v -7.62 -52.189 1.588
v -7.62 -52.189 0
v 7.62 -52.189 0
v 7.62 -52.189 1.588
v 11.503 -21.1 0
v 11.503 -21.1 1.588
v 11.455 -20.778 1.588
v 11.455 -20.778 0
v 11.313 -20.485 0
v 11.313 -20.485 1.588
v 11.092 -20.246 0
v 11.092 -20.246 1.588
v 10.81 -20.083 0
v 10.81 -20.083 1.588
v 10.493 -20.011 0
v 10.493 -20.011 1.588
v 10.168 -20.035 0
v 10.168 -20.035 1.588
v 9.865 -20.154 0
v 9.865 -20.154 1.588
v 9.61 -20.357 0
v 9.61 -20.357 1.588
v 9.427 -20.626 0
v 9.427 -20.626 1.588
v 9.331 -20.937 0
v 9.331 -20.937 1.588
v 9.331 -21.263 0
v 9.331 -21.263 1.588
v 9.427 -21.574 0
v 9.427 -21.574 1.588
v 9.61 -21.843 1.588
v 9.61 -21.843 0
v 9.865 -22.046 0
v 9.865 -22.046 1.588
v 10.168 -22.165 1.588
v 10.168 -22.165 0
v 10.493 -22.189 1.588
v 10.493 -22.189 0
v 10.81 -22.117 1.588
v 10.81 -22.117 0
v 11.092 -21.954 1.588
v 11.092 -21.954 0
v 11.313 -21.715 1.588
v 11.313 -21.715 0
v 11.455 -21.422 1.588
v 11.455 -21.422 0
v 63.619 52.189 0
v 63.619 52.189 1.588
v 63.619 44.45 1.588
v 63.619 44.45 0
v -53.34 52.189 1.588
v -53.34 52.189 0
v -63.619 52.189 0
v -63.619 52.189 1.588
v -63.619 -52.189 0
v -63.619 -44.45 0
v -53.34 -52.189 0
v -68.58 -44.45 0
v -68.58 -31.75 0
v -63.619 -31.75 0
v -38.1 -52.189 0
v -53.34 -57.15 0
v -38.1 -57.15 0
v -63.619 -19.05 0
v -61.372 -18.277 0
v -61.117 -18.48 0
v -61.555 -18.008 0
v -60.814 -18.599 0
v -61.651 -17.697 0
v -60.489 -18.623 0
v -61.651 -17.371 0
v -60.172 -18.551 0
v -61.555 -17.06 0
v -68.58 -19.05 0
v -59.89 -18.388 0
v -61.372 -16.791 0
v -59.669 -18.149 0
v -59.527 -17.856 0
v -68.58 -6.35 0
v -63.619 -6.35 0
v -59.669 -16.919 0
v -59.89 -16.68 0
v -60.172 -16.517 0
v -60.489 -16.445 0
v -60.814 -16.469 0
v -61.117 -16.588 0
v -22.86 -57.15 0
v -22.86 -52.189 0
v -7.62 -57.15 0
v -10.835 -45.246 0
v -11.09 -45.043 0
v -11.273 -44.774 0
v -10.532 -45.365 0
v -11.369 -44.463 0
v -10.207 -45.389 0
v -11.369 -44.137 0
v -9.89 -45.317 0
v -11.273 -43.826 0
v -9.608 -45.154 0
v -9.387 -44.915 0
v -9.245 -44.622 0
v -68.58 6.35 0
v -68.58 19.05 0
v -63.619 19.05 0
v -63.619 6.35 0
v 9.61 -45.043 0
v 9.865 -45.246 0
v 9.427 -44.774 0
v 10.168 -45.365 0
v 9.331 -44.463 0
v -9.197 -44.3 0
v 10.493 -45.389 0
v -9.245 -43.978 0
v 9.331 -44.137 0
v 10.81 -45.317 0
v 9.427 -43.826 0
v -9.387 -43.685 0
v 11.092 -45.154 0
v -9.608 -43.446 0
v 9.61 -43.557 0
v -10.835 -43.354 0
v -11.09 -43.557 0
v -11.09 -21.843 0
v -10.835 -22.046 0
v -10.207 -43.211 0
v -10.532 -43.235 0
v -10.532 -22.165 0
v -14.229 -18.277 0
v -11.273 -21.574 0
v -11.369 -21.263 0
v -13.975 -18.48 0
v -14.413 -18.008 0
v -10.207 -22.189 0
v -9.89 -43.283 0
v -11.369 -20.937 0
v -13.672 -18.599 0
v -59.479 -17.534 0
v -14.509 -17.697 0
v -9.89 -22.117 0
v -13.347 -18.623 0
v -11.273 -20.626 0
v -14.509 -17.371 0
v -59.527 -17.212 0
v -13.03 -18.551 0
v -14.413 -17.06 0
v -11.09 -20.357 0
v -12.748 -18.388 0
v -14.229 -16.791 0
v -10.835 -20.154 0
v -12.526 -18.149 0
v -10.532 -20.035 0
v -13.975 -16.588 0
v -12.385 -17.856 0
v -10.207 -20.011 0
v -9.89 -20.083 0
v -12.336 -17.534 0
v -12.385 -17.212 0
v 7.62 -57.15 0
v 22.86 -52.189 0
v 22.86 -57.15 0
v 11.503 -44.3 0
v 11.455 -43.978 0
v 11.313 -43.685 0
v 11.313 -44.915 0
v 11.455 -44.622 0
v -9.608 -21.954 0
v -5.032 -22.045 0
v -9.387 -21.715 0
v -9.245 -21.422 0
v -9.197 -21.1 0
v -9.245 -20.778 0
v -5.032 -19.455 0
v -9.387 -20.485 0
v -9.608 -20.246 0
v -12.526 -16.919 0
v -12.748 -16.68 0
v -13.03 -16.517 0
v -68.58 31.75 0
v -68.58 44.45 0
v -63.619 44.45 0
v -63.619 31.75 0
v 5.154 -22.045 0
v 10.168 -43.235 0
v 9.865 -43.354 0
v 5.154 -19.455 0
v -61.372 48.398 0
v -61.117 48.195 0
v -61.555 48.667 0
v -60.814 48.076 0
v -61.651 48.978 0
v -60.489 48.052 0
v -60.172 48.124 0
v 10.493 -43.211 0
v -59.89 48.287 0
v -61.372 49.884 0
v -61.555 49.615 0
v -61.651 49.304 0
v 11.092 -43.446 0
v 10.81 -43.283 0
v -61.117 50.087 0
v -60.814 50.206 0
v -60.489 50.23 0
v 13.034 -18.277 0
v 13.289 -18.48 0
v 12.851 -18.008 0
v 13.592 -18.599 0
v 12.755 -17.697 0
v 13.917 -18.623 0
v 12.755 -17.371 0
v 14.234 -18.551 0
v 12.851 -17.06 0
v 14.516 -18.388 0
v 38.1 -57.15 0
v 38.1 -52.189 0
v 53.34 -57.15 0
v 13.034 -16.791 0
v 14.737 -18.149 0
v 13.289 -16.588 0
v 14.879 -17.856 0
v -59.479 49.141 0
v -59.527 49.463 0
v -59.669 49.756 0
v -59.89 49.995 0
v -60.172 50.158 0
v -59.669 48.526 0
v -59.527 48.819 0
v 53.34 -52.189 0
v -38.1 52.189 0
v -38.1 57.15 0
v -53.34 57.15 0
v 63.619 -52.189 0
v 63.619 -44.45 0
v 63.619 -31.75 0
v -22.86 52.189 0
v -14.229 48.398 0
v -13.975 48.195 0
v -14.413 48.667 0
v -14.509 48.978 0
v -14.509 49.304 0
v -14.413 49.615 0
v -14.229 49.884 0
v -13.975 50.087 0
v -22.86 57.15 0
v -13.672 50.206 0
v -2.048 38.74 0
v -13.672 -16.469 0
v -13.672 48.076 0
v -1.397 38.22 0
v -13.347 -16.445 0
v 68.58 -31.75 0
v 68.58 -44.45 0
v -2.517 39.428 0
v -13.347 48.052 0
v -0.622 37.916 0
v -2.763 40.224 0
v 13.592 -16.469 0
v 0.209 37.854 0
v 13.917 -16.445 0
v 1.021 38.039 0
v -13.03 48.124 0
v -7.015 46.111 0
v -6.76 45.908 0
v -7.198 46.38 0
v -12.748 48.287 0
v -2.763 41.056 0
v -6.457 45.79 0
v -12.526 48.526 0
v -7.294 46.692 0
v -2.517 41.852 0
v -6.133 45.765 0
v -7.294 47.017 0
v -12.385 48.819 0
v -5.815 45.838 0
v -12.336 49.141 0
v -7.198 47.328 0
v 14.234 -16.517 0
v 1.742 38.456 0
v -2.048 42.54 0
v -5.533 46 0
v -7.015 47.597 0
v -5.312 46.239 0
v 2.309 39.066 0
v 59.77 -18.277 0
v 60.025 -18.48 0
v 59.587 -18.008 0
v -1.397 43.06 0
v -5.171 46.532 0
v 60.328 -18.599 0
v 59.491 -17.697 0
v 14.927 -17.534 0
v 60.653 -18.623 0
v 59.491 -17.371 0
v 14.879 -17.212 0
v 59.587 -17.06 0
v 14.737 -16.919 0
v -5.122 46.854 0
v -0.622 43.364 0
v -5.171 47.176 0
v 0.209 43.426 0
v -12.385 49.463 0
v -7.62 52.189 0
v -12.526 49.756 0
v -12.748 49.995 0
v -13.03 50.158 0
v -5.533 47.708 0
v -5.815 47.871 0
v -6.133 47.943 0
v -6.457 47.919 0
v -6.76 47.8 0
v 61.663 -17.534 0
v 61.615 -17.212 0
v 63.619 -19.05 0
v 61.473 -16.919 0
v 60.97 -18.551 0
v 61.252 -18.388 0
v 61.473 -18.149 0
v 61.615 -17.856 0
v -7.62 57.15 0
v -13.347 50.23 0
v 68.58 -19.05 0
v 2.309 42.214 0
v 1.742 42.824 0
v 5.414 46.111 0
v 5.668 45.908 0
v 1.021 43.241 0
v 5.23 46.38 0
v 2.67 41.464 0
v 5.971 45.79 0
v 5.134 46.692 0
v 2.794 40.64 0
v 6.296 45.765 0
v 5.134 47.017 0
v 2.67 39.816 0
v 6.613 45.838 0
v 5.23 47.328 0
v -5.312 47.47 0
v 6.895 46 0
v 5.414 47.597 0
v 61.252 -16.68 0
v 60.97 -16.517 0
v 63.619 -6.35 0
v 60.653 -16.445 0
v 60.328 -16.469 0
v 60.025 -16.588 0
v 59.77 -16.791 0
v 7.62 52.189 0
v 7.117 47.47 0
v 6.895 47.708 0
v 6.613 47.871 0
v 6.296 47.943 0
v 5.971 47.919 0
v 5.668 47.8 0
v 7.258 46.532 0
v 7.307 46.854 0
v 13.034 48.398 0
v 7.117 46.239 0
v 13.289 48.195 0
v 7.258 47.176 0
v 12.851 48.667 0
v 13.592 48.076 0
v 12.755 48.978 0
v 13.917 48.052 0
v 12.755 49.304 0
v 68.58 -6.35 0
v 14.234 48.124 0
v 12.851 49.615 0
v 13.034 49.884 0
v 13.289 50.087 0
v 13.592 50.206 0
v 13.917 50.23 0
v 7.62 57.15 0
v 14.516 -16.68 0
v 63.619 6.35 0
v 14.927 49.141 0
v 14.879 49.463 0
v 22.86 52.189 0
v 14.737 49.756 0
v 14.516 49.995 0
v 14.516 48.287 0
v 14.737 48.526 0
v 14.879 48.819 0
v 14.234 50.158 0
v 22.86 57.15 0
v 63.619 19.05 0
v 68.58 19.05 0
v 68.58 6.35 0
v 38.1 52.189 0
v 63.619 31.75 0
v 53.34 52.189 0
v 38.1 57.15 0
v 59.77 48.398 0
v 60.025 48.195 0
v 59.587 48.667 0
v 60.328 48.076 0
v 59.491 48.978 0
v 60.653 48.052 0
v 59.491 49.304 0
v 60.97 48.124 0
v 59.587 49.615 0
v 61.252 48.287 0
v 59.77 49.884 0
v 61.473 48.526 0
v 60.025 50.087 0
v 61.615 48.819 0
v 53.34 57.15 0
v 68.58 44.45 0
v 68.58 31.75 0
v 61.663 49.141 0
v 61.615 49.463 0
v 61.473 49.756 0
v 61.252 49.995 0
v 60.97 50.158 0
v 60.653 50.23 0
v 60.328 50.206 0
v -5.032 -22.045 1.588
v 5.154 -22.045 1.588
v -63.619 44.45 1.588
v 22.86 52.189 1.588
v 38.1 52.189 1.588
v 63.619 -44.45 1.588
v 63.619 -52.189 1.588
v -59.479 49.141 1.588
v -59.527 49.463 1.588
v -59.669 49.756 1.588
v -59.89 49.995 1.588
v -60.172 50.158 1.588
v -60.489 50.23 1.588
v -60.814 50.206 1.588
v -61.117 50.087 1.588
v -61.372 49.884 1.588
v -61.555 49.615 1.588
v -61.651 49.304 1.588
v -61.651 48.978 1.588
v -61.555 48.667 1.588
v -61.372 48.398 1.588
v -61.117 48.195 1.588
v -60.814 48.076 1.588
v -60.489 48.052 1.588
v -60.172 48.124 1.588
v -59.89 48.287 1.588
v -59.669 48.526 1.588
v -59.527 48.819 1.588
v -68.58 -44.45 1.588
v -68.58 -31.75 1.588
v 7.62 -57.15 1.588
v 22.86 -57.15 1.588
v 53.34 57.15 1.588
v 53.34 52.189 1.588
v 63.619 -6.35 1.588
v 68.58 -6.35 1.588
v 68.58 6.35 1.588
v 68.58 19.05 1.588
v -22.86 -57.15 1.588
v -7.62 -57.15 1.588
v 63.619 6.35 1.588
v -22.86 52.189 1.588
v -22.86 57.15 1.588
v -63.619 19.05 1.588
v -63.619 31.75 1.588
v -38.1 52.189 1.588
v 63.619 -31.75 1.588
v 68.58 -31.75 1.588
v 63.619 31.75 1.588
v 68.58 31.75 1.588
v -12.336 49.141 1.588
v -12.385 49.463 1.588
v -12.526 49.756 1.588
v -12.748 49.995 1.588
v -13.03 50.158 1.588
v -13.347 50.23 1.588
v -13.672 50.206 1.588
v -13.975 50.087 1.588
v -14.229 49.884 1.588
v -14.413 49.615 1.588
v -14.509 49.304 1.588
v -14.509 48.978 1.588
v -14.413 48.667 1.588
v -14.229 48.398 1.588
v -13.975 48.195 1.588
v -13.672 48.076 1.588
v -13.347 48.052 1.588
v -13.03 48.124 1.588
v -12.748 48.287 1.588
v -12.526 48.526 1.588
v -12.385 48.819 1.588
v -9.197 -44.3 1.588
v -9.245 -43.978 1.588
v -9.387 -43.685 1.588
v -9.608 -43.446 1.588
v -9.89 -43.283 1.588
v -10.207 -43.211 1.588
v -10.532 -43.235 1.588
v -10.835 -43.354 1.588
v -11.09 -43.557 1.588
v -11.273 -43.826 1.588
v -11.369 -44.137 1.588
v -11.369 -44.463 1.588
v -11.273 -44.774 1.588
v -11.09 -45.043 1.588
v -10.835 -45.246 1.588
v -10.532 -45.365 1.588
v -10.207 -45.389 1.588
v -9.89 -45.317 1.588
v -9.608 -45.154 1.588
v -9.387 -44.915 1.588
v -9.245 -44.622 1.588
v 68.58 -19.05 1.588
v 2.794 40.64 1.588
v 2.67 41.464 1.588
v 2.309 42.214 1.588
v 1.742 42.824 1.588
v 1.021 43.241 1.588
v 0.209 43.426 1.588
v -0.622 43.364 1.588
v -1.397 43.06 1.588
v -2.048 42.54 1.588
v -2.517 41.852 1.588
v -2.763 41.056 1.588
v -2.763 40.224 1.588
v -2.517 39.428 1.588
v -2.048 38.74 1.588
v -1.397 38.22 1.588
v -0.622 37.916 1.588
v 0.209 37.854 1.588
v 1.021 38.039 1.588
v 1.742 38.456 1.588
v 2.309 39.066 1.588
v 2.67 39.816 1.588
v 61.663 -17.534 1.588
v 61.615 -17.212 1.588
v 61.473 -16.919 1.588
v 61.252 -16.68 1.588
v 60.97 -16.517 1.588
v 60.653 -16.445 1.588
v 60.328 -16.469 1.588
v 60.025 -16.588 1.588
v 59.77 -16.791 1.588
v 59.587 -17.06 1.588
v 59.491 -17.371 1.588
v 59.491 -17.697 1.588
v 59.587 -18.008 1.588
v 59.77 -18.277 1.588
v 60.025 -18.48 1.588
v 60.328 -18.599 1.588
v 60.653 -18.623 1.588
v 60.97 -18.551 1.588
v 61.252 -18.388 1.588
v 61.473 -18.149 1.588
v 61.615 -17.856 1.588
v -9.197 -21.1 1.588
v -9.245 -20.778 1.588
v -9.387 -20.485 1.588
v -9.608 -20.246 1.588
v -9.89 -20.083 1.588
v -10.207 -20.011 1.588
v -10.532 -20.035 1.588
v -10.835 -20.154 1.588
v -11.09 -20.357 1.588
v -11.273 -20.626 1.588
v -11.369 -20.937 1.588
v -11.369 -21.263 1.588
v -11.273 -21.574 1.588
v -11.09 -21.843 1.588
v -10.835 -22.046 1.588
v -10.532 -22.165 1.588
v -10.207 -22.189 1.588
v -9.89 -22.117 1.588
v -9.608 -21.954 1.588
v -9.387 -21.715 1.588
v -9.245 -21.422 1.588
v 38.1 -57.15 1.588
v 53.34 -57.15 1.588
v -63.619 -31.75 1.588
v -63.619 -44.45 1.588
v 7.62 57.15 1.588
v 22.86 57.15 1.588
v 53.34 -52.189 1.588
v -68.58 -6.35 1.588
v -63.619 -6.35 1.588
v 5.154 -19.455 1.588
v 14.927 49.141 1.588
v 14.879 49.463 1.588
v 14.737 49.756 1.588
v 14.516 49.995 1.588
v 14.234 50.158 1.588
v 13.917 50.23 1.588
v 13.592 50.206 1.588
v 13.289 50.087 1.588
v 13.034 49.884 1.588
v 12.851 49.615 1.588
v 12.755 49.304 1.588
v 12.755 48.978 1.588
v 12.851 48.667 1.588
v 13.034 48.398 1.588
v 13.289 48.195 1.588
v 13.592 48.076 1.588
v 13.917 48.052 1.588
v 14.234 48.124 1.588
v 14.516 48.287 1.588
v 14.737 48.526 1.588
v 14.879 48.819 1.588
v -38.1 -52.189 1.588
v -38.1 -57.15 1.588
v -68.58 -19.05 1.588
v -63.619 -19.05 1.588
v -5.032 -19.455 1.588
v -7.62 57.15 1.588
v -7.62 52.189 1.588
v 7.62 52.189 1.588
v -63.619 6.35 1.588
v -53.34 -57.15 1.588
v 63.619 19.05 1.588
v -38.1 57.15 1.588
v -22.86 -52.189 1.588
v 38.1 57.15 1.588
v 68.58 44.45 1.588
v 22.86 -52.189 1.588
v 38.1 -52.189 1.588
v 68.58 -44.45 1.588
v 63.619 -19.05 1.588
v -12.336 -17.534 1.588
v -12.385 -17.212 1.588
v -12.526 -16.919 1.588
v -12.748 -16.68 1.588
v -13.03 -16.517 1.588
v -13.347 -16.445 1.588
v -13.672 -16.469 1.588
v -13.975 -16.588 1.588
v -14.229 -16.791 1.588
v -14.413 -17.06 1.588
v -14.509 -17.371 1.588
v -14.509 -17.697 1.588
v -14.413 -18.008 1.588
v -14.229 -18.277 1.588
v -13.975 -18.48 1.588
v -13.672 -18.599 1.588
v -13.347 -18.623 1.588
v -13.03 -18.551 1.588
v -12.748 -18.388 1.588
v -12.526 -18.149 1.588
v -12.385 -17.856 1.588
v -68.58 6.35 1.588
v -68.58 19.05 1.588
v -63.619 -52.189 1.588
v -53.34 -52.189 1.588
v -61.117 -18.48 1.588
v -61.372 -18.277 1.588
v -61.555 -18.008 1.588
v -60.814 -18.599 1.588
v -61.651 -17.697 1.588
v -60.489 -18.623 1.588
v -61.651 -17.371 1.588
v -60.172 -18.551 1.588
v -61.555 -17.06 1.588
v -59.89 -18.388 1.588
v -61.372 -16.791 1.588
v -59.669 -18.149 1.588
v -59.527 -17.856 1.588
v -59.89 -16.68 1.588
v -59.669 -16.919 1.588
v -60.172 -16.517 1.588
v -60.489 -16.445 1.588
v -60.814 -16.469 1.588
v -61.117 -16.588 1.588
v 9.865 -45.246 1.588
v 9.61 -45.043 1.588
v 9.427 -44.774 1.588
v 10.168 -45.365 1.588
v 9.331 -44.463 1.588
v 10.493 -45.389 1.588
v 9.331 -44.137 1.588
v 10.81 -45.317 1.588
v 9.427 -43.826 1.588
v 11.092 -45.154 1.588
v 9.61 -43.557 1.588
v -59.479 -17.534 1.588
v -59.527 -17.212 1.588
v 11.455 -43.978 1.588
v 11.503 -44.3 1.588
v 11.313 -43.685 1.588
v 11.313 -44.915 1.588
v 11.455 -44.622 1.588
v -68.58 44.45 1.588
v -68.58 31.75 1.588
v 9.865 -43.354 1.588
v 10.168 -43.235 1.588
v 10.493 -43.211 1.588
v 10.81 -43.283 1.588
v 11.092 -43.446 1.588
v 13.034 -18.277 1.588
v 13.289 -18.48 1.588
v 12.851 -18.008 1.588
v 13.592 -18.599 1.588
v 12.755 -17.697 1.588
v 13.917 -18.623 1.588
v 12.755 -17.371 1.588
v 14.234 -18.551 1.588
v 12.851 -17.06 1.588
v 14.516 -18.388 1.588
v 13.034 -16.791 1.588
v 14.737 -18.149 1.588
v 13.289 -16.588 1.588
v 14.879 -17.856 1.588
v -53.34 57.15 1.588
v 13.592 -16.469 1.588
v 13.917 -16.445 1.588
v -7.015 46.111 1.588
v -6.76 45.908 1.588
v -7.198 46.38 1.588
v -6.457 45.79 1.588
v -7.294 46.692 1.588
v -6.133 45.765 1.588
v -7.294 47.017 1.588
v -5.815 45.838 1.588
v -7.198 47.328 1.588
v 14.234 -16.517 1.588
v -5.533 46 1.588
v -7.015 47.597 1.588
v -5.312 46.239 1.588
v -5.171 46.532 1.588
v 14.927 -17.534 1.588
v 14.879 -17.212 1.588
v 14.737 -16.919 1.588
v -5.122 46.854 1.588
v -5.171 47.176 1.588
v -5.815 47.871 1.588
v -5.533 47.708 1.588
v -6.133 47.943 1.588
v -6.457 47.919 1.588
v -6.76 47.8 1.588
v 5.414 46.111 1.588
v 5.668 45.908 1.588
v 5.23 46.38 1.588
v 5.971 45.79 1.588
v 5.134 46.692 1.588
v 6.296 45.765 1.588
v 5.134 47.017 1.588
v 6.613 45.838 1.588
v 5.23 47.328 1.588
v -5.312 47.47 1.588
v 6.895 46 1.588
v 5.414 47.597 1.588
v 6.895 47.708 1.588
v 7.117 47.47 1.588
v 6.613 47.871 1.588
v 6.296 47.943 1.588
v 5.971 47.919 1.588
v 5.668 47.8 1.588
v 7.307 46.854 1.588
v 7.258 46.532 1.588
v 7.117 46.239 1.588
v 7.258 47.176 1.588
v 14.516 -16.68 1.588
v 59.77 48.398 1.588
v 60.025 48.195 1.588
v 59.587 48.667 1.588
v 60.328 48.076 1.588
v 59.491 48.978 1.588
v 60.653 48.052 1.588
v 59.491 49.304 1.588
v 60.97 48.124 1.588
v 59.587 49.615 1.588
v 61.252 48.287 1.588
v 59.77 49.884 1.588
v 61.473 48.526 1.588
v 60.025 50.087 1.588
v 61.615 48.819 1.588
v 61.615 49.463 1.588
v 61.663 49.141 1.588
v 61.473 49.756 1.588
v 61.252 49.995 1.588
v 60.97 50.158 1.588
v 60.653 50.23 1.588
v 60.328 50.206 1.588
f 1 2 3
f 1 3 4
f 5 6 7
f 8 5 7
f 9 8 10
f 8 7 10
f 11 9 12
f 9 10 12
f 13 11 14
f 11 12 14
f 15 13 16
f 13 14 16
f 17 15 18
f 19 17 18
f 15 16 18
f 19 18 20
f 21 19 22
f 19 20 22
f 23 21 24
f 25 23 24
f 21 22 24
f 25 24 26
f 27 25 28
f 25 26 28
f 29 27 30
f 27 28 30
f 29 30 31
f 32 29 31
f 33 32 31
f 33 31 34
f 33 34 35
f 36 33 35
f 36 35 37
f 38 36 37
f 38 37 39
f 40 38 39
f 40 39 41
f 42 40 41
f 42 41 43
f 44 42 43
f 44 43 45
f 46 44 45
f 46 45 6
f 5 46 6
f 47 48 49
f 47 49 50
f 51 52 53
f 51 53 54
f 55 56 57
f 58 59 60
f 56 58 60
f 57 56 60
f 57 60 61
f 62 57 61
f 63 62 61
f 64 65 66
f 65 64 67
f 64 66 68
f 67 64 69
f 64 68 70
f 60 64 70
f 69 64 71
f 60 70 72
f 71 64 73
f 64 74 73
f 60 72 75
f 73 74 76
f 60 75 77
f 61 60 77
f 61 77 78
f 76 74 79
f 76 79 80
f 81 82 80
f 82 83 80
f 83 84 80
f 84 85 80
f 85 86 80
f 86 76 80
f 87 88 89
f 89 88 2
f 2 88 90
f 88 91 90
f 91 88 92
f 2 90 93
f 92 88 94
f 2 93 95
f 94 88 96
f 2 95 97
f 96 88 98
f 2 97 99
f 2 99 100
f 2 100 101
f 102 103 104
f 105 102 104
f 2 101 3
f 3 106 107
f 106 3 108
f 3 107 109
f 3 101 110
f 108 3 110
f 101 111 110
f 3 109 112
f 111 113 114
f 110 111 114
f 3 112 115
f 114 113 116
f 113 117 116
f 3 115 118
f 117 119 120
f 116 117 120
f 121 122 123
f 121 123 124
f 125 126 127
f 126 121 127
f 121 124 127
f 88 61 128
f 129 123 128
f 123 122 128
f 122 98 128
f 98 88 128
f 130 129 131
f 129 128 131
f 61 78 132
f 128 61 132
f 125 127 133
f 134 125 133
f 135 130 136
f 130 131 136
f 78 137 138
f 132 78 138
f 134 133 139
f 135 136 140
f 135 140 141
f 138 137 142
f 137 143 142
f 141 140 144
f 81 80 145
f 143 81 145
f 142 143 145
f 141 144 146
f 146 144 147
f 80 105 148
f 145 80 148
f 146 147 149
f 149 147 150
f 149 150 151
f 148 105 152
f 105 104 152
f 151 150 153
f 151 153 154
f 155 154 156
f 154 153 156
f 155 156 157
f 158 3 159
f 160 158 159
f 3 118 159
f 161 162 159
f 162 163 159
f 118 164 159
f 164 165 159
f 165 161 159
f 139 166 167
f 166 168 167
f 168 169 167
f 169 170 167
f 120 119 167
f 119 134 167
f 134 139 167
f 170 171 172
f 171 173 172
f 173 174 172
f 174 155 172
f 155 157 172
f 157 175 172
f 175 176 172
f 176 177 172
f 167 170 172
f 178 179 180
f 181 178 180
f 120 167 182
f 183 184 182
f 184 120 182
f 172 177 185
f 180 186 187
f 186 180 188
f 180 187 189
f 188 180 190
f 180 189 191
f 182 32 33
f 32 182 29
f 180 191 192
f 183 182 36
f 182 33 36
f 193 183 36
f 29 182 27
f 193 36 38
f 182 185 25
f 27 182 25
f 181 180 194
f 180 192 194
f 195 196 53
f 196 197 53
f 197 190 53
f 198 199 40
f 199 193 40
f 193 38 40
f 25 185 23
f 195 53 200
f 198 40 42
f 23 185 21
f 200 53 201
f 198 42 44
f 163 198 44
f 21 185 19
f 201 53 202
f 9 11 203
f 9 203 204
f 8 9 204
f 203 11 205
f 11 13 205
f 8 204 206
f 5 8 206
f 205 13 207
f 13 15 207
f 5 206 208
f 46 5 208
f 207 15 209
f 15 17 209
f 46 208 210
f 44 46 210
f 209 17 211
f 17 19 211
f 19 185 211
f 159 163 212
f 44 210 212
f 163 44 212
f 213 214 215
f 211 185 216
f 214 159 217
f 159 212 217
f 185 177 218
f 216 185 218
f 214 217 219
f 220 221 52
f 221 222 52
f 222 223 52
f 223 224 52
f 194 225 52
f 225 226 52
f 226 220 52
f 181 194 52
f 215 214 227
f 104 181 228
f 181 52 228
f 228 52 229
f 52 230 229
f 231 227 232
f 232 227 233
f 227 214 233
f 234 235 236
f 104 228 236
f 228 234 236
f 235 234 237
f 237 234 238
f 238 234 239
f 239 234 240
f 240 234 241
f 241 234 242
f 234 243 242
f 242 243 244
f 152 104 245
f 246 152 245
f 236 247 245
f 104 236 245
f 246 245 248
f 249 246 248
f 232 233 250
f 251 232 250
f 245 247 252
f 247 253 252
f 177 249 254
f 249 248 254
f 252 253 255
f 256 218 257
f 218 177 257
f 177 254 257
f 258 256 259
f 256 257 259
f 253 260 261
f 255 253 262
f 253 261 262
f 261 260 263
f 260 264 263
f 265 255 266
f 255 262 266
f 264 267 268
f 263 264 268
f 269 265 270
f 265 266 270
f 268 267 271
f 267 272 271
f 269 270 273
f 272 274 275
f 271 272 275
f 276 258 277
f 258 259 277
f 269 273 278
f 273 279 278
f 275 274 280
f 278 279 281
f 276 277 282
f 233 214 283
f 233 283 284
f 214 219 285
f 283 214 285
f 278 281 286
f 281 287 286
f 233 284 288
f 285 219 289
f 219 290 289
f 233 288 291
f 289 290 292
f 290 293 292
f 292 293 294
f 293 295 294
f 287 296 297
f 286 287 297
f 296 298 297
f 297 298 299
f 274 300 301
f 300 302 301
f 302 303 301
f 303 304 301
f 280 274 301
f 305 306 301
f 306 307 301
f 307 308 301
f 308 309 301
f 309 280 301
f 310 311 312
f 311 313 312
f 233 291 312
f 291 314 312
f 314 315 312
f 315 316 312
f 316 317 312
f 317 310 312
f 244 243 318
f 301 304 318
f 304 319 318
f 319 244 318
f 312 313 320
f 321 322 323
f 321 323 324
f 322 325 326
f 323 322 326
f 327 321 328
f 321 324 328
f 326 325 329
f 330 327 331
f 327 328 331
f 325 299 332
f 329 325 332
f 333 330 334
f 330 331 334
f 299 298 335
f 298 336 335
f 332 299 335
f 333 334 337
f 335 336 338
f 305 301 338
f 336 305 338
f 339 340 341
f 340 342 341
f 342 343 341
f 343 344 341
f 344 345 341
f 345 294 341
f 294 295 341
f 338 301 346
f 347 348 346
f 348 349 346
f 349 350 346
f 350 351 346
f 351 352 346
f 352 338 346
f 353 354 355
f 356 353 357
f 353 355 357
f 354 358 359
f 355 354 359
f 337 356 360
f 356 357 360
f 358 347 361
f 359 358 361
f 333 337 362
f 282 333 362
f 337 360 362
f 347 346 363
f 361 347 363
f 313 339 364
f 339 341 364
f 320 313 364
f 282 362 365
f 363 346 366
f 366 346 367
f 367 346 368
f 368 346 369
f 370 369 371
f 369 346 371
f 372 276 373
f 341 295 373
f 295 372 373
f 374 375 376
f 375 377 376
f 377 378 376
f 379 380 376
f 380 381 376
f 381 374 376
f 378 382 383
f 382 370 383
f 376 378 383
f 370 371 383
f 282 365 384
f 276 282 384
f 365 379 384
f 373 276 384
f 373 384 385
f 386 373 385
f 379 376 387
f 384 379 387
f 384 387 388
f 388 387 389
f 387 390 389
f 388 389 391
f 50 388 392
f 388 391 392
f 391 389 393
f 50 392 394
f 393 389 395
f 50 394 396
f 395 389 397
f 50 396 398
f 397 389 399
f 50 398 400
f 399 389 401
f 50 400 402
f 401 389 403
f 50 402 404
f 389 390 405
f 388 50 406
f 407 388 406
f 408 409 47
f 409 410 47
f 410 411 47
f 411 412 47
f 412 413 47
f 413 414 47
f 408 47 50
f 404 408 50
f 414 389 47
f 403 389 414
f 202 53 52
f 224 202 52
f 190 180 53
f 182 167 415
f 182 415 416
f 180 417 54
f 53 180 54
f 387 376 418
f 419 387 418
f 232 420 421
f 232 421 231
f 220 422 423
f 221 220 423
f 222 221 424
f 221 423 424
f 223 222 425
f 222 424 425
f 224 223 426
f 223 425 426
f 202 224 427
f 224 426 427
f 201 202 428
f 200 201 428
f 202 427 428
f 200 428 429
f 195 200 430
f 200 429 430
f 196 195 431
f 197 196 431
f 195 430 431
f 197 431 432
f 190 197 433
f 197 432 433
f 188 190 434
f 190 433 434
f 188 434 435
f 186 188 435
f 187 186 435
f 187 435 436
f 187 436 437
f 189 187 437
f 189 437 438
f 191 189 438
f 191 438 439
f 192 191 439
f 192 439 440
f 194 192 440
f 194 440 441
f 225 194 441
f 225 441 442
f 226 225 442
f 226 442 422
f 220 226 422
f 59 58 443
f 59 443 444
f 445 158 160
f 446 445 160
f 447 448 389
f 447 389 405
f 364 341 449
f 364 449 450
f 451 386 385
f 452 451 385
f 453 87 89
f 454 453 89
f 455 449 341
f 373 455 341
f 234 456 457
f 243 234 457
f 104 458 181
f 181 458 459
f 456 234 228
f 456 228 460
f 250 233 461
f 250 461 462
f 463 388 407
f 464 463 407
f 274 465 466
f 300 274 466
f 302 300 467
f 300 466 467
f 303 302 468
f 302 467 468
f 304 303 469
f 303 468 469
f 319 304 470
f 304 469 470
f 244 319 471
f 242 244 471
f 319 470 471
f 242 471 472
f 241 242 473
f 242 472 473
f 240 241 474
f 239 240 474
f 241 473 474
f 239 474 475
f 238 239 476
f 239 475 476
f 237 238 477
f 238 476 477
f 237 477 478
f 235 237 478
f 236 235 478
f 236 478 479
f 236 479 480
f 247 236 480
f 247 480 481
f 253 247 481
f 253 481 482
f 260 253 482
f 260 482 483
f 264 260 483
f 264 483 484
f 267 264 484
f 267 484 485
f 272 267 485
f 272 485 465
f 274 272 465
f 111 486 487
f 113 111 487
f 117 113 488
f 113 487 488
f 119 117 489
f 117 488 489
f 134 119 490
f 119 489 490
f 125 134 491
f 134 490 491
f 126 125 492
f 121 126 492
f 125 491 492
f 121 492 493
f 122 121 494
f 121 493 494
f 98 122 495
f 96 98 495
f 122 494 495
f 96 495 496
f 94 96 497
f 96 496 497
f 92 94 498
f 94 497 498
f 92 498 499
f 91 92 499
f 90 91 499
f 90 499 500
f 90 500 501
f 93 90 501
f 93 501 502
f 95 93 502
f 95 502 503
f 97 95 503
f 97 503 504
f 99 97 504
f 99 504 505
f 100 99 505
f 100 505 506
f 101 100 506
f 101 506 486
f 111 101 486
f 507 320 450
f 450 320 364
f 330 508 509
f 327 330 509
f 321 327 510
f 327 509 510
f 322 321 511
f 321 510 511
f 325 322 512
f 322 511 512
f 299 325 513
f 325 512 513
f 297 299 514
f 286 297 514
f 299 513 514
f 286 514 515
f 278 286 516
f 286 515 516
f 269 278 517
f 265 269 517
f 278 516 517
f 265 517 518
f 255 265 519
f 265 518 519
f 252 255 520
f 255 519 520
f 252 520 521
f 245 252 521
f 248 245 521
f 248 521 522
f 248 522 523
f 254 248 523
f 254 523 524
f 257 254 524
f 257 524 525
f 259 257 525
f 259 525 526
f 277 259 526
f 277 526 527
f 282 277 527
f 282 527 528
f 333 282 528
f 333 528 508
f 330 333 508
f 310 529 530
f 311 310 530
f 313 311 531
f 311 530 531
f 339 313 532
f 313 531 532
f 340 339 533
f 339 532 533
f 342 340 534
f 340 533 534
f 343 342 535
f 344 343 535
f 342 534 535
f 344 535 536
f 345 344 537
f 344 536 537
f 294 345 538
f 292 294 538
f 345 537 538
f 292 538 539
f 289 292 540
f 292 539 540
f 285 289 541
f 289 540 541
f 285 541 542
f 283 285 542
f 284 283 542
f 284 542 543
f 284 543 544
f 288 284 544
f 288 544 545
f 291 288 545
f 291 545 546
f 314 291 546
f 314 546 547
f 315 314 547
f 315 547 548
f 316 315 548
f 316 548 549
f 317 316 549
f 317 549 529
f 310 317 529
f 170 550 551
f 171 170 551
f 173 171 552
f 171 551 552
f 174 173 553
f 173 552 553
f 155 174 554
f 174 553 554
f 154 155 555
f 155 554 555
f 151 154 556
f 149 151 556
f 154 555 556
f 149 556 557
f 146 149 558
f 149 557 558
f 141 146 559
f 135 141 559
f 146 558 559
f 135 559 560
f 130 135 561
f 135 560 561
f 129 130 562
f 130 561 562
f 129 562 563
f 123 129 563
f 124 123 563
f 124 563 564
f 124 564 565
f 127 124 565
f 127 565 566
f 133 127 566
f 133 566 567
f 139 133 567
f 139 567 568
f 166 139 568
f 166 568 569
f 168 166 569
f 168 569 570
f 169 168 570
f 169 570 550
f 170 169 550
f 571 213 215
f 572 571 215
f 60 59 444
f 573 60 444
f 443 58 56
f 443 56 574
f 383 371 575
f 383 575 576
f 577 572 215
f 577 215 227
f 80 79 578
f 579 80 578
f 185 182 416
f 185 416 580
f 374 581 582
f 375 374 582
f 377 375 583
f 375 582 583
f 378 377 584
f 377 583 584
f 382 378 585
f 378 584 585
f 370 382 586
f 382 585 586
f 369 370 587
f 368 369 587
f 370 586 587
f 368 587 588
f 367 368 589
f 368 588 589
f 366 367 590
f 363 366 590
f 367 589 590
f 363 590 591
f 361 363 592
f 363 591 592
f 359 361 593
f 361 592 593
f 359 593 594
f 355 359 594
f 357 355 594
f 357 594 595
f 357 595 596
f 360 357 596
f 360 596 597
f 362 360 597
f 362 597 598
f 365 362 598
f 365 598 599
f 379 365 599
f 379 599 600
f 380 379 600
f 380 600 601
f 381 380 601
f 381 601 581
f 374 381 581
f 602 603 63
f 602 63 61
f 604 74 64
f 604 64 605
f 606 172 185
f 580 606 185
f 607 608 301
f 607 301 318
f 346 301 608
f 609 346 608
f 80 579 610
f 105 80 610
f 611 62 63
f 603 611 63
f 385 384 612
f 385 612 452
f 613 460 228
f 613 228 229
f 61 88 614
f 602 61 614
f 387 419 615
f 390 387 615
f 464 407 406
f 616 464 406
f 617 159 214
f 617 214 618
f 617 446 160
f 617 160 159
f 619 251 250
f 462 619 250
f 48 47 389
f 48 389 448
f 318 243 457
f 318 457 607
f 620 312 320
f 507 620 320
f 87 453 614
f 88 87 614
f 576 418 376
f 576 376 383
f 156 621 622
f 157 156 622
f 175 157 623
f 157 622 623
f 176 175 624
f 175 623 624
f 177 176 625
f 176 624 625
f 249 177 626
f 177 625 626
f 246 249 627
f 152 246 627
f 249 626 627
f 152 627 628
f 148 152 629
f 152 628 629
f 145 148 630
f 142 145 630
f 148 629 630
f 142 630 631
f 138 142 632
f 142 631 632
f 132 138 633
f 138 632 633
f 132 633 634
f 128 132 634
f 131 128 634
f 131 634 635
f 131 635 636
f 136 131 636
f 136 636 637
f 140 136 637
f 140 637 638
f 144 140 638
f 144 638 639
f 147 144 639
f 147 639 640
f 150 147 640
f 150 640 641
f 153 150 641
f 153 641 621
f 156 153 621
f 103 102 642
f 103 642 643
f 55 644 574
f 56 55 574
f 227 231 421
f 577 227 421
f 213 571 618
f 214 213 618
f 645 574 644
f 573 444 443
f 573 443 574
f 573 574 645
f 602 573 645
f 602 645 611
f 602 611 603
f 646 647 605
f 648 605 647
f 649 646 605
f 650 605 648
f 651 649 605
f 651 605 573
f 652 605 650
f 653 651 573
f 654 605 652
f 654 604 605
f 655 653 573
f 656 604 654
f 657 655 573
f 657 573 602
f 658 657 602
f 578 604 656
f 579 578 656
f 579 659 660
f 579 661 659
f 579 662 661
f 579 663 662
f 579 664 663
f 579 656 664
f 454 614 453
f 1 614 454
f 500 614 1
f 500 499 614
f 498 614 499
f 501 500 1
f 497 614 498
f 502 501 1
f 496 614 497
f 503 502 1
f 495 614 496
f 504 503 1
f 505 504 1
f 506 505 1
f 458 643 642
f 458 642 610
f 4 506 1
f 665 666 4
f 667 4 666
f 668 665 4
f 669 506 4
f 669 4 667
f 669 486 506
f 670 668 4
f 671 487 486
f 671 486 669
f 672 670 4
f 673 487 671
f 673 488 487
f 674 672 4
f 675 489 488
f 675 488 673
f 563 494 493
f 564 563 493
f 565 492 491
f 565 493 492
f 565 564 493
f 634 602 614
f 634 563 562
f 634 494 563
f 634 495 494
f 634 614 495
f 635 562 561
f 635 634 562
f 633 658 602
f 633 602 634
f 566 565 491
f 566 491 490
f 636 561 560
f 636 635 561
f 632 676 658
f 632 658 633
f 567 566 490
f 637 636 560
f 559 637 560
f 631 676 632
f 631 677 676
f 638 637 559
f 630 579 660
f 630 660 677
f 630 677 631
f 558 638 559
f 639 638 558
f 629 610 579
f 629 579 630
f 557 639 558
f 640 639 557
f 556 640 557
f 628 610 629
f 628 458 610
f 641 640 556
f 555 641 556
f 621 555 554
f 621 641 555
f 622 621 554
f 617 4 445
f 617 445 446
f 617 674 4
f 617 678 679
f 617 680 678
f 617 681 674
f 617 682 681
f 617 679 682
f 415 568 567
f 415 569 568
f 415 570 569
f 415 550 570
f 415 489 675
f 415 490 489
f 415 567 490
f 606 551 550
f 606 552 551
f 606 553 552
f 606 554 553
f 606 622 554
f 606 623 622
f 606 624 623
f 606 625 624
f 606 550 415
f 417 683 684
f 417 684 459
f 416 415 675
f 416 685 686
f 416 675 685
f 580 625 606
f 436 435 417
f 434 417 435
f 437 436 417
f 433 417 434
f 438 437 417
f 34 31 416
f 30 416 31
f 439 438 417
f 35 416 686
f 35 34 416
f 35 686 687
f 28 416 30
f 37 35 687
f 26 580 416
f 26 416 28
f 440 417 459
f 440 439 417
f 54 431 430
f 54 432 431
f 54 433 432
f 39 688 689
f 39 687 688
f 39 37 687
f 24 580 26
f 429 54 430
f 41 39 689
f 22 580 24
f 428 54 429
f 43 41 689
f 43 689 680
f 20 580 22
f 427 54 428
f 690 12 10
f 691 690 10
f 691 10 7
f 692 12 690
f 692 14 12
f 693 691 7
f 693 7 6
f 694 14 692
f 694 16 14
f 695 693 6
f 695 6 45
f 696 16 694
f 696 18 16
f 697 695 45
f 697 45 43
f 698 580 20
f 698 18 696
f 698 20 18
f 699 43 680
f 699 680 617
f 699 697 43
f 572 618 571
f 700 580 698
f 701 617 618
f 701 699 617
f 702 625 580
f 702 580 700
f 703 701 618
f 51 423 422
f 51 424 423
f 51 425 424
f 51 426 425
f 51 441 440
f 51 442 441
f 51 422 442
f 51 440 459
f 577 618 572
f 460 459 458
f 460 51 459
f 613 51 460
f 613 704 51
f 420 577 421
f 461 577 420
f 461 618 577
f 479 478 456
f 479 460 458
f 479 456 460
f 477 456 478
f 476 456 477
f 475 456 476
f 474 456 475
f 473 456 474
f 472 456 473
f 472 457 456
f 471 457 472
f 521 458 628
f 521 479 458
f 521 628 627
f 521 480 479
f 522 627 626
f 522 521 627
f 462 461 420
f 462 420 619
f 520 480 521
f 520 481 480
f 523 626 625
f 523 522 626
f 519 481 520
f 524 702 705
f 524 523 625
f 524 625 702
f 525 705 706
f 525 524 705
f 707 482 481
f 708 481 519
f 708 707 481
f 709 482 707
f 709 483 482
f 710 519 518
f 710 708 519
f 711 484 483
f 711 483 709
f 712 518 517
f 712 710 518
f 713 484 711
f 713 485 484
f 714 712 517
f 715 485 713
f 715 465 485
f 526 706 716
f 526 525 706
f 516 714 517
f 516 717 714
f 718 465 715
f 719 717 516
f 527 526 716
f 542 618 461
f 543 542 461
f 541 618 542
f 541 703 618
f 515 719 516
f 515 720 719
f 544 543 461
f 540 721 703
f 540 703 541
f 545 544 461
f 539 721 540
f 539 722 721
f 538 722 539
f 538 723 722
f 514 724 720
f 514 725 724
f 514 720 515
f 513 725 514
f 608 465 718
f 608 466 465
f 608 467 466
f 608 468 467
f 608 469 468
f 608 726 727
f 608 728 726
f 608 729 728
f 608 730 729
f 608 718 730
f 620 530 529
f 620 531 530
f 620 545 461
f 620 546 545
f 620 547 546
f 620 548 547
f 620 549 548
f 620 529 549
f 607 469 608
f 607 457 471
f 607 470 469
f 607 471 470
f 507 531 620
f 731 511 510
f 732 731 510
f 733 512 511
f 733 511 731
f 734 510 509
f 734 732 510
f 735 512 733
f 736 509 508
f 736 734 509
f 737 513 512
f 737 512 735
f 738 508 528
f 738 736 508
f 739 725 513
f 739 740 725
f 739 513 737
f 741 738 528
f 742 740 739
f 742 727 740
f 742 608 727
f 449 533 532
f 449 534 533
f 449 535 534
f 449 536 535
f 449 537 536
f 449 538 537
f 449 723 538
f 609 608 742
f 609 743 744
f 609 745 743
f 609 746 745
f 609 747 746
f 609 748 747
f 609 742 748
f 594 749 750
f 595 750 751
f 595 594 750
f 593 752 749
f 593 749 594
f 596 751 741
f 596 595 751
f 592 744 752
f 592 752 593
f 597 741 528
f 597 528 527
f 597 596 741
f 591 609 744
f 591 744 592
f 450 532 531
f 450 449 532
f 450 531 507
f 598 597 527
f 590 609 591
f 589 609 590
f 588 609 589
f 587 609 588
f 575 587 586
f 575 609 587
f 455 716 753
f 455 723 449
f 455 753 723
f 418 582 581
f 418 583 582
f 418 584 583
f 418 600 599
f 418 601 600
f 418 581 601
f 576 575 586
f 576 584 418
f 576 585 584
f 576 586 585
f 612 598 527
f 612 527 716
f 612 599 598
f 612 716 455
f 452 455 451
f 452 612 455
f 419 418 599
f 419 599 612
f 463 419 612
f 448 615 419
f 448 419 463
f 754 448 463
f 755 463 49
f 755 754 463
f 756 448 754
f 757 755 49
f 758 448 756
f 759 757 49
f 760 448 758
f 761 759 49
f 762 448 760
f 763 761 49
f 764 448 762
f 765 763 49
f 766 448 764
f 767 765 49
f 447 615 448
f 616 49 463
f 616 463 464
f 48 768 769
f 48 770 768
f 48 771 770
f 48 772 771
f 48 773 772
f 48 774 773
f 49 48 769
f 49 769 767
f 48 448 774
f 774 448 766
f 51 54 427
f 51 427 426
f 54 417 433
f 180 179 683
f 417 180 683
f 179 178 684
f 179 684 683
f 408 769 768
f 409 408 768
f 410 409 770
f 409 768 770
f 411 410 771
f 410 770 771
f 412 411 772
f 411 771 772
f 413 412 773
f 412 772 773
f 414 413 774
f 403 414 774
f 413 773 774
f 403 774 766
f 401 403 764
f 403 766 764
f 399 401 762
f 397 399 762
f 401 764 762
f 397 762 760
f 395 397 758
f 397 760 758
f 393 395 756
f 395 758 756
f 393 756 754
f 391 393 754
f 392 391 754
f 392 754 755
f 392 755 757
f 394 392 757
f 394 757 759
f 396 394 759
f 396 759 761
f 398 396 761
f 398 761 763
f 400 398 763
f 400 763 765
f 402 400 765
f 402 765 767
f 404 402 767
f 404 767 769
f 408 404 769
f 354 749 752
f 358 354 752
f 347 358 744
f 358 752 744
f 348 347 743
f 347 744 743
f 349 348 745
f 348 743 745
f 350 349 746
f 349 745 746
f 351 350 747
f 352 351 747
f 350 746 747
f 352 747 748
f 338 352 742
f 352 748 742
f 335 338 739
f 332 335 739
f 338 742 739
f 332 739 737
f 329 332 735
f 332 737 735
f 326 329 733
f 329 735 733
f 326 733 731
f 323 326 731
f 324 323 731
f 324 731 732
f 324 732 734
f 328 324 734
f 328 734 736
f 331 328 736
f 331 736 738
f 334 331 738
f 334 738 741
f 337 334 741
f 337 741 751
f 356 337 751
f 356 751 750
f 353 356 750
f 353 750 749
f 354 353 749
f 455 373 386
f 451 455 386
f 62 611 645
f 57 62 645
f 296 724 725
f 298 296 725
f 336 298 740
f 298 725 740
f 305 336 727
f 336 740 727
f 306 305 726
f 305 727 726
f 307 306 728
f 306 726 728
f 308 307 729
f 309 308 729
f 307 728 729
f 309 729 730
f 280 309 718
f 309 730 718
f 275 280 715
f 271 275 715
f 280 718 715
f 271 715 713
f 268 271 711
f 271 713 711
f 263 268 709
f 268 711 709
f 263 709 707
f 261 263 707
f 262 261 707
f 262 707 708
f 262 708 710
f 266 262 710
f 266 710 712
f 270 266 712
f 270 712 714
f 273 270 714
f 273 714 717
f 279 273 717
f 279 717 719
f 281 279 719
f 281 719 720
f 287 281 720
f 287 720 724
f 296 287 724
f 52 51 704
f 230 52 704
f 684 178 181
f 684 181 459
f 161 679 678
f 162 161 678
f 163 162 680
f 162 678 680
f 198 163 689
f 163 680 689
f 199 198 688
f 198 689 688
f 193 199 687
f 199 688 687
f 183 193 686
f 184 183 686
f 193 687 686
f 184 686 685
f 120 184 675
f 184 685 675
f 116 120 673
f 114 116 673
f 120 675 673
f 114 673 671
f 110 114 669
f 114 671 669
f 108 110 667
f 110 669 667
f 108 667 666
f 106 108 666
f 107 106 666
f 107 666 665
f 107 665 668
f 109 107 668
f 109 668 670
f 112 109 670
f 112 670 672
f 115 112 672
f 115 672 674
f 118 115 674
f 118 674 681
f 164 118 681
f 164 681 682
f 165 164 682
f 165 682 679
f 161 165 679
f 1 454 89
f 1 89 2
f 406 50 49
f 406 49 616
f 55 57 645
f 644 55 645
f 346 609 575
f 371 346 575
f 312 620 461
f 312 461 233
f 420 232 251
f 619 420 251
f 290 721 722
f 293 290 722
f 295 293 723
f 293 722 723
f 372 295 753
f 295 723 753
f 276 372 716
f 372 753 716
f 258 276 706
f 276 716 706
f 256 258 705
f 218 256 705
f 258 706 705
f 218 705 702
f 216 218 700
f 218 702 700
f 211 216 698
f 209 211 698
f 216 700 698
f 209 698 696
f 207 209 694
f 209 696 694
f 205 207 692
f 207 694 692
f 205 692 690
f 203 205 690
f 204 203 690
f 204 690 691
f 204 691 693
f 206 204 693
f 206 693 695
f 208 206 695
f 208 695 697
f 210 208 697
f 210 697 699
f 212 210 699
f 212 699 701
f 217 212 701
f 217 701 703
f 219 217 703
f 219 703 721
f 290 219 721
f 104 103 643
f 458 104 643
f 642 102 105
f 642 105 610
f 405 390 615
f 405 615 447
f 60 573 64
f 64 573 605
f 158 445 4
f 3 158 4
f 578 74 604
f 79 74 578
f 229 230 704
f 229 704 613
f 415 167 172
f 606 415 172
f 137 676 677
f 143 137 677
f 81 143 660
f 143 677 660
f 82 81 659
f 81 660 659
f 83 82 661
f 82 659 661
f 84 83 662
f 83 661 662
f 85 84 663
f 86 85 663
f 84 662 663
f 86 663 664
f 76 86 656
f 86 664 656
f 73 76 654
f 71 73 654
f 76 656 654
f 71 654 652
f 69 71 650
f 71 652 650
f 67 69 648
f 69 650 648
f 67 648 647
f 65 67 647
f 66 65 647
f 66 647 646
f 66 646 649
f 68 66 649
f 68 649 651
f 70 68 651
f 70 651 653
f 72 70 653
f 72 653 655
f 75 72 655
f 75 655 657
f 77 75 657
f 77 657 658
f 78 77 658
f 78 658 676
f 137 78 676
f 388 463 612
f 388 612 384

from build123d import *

# Parameters (mm, degrees)
SKETCH1_W               = 137.16
SKETCH1_H               = 114.3
BOSS_EXTRUDE1_DEPTH     = 1.5875
SKETCH2_R               = 2.794
CUT_EXTRUDE2_DEPTH      = 90.285267857
CAVITY7_START           = -68.58
CAVITY7_OUTLINE_W       = 4.9609375
CAVITY7_OUTLINE_H       = 1.5875
CAVITY7_DEPTH           = 15.24
CAVITY7_START_2         = -38.1
CAVITY7_2_OUTLINE_W     = 4.9609375
CAVITY7_2_OUTLINE_H     = 1.5875
CAVITY7_2_DEPTH         = 15.24
CAVITY7_START_3         = -7.62
CAVITY7_3_OUTLINE_W     = 4.9609375
CAVITY7_3_OUTLINE_H     = 1.5875
CAVITY7_3_DEPTH         = 15.24
CAVITY7_START_4         = 22.86
CAVITY7_4_OUTLINE_W     = 4.9609375
CAVITY7_4_OUTLINE_H     = 1.5875
CAVITY7_4_DEPTH         = 15.24
CAVITY7_START_5         = 53.34
CAVITY7_5_OUTLINE_W     = 4.9609375
CAVITY7_5_OUTLINE_H     = 1.5875
CAVITY7_5_DEPTH         = 15.24
CAVITY8_START           = -68.58
CAVITY8_OUTLINE_W       = 4.9609375
CAVITY8_OUTLINE_H       = 1.5875
CAVITY8_DEPTH           = 15.24
CAVITY8_START_2         = -38.1
CAVITY8_2_OUTLINE_W     = 4.9609375
CAVITY8_2_OUTLINE_H     = 1.5875
CAVITY8_2_DEPTH         = 15.24
CAVITY8_START_3         = -7.62
CAVITY8_3_OUTLINE_W     = 4.9609375
CAVITY8_3_OUTLINE_H     = 1.5875
CAVITY8_3_DEPTH         = 15.24
CAVITY8_START_4         = 22.86
CAVITY8_4_OUTLINE_W     = 4.9609375
CAVITY8_4_OUTLINE_H     = 1.5875
CAVITY8_4_DEPTH         = 15.24
CAVITY8_START_5         = 53.34
CAVITY8_5_OUTLINE_W     = 4.9609375
CAVITY8_5_OUTLINE_H     = 1.5875
CAVITY8_5_DEPTH         = 15.24
CAVITY9_START           = -68.58
CAVITY9_OUTLINE_W       = 7.7390625
CAVITY9_OUTLINE_H       = 1.5875
CAVITY9_OUTLINE_W_2     = 12.7
CAVITY9_DEPTH           = 4.9609375
CAVITY10_START          = -31.75
CAVITY10_OUTLINE_W      = 4.9609375
CAVITY10_OUTLINE_H      = 1.5875
CAVITY10_DEPTH          = 12.7
CAVITY10_START_2        = -6.35
CAVITY10_2_OUTLINE_W    = 4.9609375
CAVITY10_2_OUTLINE_H    = 1.5875
CAVITY10_2_DEPTH        = 12.7
CAVITY10_START_3        = 19.05
CAVITY10_3_OUTLINE_W    = 4.9609375
CAVITY10_3_OUTLINE_H    = 1.5875
CAVITY10_3_DEPTH        = 12.7
CAVITY10_START_4        = -52.1890625
CAVITY10_4_OUTLINE_W    = 4.9609375
CAVITY10_4_OUTLINE_H    = 1.5875
CAVITY10_4_DEPTH        = 7.7390625
CAVITY10_START_5        = 44.45
CAVITY10_5_OUTLINE_W    = 4.9609375
CAVITY10_5_OUTLINE_H    = 1.5875
CAVITY10_5_DEPTH        = 7.7390625
CUT_EXTRUDE6_DEPTH      = 90.285267857
CUT_EXTRUDE6_DEPTH_BACK = 90.285267857
SKETCH3_W               = 10.1854
SKETCH3_H               = 2.5908
SKETCH5_R               = 1.0922
CUT_EXTRUDE7_DEPTH      = 90.285267857
SKETCH6_R               = 1.0922
CUT_EXTRUDE8_DEPTH      = 90.285267857
SKETCH7_R               = 1.0922
CUT_EXTRUDE9_DEPTH      = 90.285267857
SKETCH8_R               = 1.0922
CUT_EXTRUDE10_DEPTH     = 90.285267857
SKETCH9_R               = 1.0922
CUT_EXTRUDE11_DEPTH     = 90.285267857
SKETCH10_R              = 1.0922
CUT_EXTRUDE12_DEPTH     = 90.285267857


# Read off the part's stored shape, not the designer's step: Cavity7, Cavity8, Cavity9, Cavity10
with BuildPart() as part:
    # Sketch1 → Boss-Extrude1 (new body)
    with BuildSketch(Plane.XY):
        Rectangle(SKETCH1_W, SKETCH1_H)
    extrude(amount=BOSS_EXTRUDE1_DEPTH)

    # Sketch2 → Cut-Extrude2 (cut, through all)
    with BuildSketch(Plane.XY.offset(1.5875)):
        with Locations((0, 40.64)):
            Circle(SKETCH2_R)
    extrude(amount=-CUT_EXTRUDE2_DEPTH, mode=Mode.SUBTRACT)

    # Cavity7 outline → Cavity7 (cut)
    with BuildSketch(Plane.YZ.offset(CAVITY7_START)):
        with Locations((-54.66953125, 0.79375)):
            Rectangle(CAVITY7_OUTLINE_W, CAVITY7_OUTLINE_H)
    extrude(amount=CAVITY7_DEPTH, mode=Mode.SUBTRACT)

    # Cavity7 2 outline → Cavity7 2 (cut)
    with BuildSketch(Plane.YZ.offset(CAVITY7_START_2)):
        with Locations((-54.66953125, 0.79375)):
            Rectangle(CAVITY7_2_OUTLINE_W, CAVITY7_2_OUTLINE_H)
    extrude(amount=CAVITY7_2_DEPTH, mode=Mode.SUBTRACT)

    # Cavity7 3 outline → Cavity7 3 (cut)
    with BuildSketch(Plane.YZ.offset(CAVITY7_START_3)):
        with Locations((-54.66953125, 0.79375)):
            Rectangle(CAVITY7_3_OUTLINE_W, CAVITY7_3_OUTLINE_H)
    extrude(amount=CAVITY7_3_DEPTH, mode=Mode.SUBTRACT)

    # Cavity7 4 outline → Cavity7 4 (cut)
    with BuildSketch(Plane.YZ.offset(CAVITY7_START_4)):
        with Locations((-54.66953125, 0.79375)):
            Rectangle(CAVITY7_4_OUTLINE_W, CAVITY7_4_OUTLINE_H)
    extrude(amount=CAVITY7_4_DEPTH, mode=Mode.SUBTRACT)

    # Cavity7 5 outline → Cavity7 5 (cut)
    with BuildSketch(Plane.YZ.offset(CAVITY7_START_5)):
        with Locations((-54.66953125, 0.79375)):
            Rectangle(CAVITY7_5_OUTLINE_W, CAVITY7_5_OUTLINE_H)
    extrude(amount=CAVITY7_5_DEPTH, mode=Mode.SUBTRACT)

    # Cavity8 outline → Cavity8 (cut)
    with BuildSketch(Plane.YZ.offset(CAVITY8_START)):
        with Locations((54.66953125, 0.79375)):
            Rectangle(CAVITY8_OUTLINE_W, CAVITY8_OUTLINE_H)
    extrude(amount=CAVITY8_DEPTH, mode=Mode.SUBTRACT)

    # Cavity8 2 outline → Cavity8 2 (cut)
    with BuildSketch(Plane.YZ.offset(CAVITY8_START_2)):
        with Locations((54.66953125, 0.79375)):
            Rectangle(CAVITY8_2_OUTLINE_W, CAVITY8_2_OUTLINE_H)
    extrude(amount=CAVITY8_2_DEPTH, mode=Mode.SUBTRACT)

    # Cavity8 3 outline → Cavity8 3 (cut)
    with BuildSketch(Plane.YZ.offset(CAVITY8_START_3)):
        with Locations((54.66953125, 0.79375)):
            Rectangle(CAVITY8_3_OUTLINE_W, CAVITY8_3_OUTLINE_H)
    extrude(amount=CAVITY8_3_DEPTH, mode=Mode.SUBTRACT)

    # Cavity8 4 outline → Cavity8 4 (cut)
    with BuildSketch(Plane.YZ.offset(CAVITY8_START_4)):
        with Locations((54.66953125, 0.79375)):
            Rectangle(CAVITY8_4_OUTLINE_W, CAVITY8_4_OUTLINE_H)
    extrude(amount=CAVITY8_4_DEPTH, mode=Mode.SUBTRACT)

    # Cavity8 5 outline → Cavity8 5 (cut)
    with BuildSketch(Plane.YZ.offset(CAVITY8_START_5)):
        with Locations((54.66953125, 0.79375)):
            Rectangle(CAVITY8_5_OUTLINE_W, CAVITY8_5_OUTLINE_H)
    extrude(amount=CAVITY8_5_DEPTH, mode=Mode.SUBTRACT)

    # Cavity9 outline → Cavity9 (cut)
    with BuildSketch(Plane.YZ.offset(CAVITY9_START)):
        with Locations((48.31953125, 0.79375)):
            Rectangle(CAVITY9_OUTLINE_W, CAVITY9_OUTLINE_H)
        with Locations((25.4, 0.79375)):
            Rectangle(CAVITY9_OUTLINE_W_2, CAVITY9_OUTLINE_H)
        with Locations((0, 0.79375)):
            Rectangle(CAVITY9_OUTLINE_W_2, CAVITY9_OUTLINE_H)
        with Locations((-25.4, 0.79375)):
            Rectangle(CAVITY9_OUTLINE_W_2, CAVITY9_OUTLINE_H)
        with Locations((-48.31953125, 0.79375)):
            Rectangle(CAVITY9_OUTLINE_W, CAVITY9_OUTLINE_H)
    extrude(amount=CAVITY9_DEPTH, mode=Mode.SUBTRACT)

    # Cavity10 outline → Cavity10 (cut)
    with BuildSketch(Plane(origin=(0, 0, 0), x_dir=(1, 0, 0), z_dir=(0, 1, 0)).offset(CAVITY10_START)):
        with Locations((66.09953125, -0.79375)):
            Rectangle(CAVITY10_OUTLINE_W, CAVITY10_OUTLINE_H)
    extrude(amount=CAVITY10_DEPTH, mode=Mode.SUBTRACT)

    # Cavity10 2 outline → Cavity10 2 (cut)
    with BuildSketch(Plane(origin=(0, 0, 0), x_dir=(1, 0, 0), z_dir=(0, 1, 0)).offset(CAVITY10_START_2)):
        with Locations((66.09953125, -0.79375)):
            Rectangle(CAVITY10_2_OUTLINE_W, CAVITY10_2_OUTLINE_H)
    extrude(amount=CAVITY10_2_DEPTH, mode=Mode.SUBTRACT)

    # Cavity10 3 outline → Cavity10 3 (cut)
    with BuildSketch(Plane(origin=(0, 0, 0), x_dir=(1, 0, 0), z_dir=(0, 1, 0)).offset(CAVITY10_START_3)):
        with Locations((66.09953125, -0.79375)):
            Rectangle(CAVITY10_3_OUTLINE_W, CAVITY10_3_OUTLINE_H)
    extrude(amount=CAVITY10_3_DEPTH, mode=Mode.SUBTRACT)

    # Cavity10 4 outline → Cavity10 4 (cut)
    with BuildSketch(Plane(origin=(0, 0, 0), x_dir=(1, 0, 0), z_dir=(0, 1, 0)).offset(CAVITY10_START_4)):
        with Locations((66.09953125, -0.79375)):
            Rectangle(CAVITY10_4_OUTLINE_W, CAVITY10_4_OUTLINE_H)
    extrude(amount=CAVITY10_4_DEPTH, mode=Mode.SUBTRACT)

    # Cavity10 5 outline → Cavity10 5 (cut)
    with BuildSketch(Plane(origin=(0, 0, 0), x_dir=(1, 0, 0), z_dir=(0, 1, 0)).offset(CAVITY10_START_5)):
        with Locations((66.09953125, -0.79375)):
            Rectangle(CAVITY10_5_OUTLINE_W, CAVITY10_5_OUTLINE_H)
    extrude(amount=CAVITY10_5_DEPTH, mode=Mode.SUBTRACT)

    # Sketch3 → Cut-Extrude6 (cut, two sides: drawn at the far end of the back side and taken through both)
    with BuildSketch(Plane.XY.offset(1.5875).offset(-CUT_EXTRUDE6_DEPTH_BACK)):
        with Locations((0.061, -20.75)):
            Rectangle(SKETCH3_W, SKETCH3_H)
    extrude(amount=CUT_EXTRUDE6_DEPTH + CUT_EXTRUDE6_DEPTH_BACK, mode=Mode.SUBTRACT)

    # Sketch5 → Cut-Extrude7 (cut, through all)
    with BuildSketch(Plane.XY.offset(1.5875)):
        with Locations((-10.289, -21.1)):
            Circle(SKETCH5_R)
    extrude(amount=-CUT_EXTRUDE7_DEPTH, mode=Mode.SUBTRACT)

    # Sketch6 → Cut-Extrude8 (cut, through all)
    with BuildSketch(Plane.XY.offset(1.5875)):
        with Locations((10.411, -21.1)):
            Circle(SKETCH6_R)
    extrude(amount=-CUT_EXTRUDE8_DEPTH, mode=Mode.SUBTRACT)

    # Sketch7 → Cut-Extrude9 (cut, through all)
    with BuildSketch(Plane.XY.offset(1.5875)):
        with Locations((10.411, -44.3)):
            Circle(SKETCH7_R)
    extrude(amount=-CUT_EXTRUDE9_DEPTH, mode=Mode.SUBTRACT)

    # Sketch8 → Cut-Extrude10 (cut, through all)
    with BuildSketch(Plane.XY.offset(1.5875)):
        with Locations((-10.289, -44.3)):
            Circle(SKETCH8_R)
    extrude(amount=-CUT_EXTRUDE10_DEPTH, mode=Mode.SUBTRACT)

    # Sketch9 → Cut-Extrude11 (cut, through all)
    with BuildSketch(Plane.XY.offset(1.5875)):
        with Locations((60.5710625, 49.1410625)):
            Circle(SKETCH9_R)
        with Locations((13.8350625, 49.1410625)):
            Circle(SKETCH9_R)
        with Locations((13.8350625, -17.5339375)):
            Circle(SKETCH9_R)
        with Locations((60.5710625, -17.5339375)):
            Circle(SKETCH9_R)
        with Locations((-13.4286625, 49.1410625)):
            Circle(SKETCH9_R)
        with Locations((-60.5710625, 49.1410625)):
            Circle(SKETCH9_R)
        with Locations((-60.5710625, -17.5339375)):
            Circle(SKETCH9_R)
        with Locations((-13.4286625, -17.5339375)):
            Circle(SKETCH9_R)
    extrude(amount=-CUT_EXTRUDE11_DEPTH, mode=Mode.SUBTRACT)

    # Sketch10 → Cut-Extrude12 (cut, through all)
    with BuildSketch(Plane.XY.offset(1.5875)):
        with Locations((-6.214337236, 46.854337236)):
            Circle(SKETCH10_R)
        with Locations((6.214337236, 46.854337236)):
            Circle(SKETCH10_R)
    extrude(amount=-CUT_EXTRUDE12_DEPTH, mode=Mode.SUBTRACT)


solid = part.part
